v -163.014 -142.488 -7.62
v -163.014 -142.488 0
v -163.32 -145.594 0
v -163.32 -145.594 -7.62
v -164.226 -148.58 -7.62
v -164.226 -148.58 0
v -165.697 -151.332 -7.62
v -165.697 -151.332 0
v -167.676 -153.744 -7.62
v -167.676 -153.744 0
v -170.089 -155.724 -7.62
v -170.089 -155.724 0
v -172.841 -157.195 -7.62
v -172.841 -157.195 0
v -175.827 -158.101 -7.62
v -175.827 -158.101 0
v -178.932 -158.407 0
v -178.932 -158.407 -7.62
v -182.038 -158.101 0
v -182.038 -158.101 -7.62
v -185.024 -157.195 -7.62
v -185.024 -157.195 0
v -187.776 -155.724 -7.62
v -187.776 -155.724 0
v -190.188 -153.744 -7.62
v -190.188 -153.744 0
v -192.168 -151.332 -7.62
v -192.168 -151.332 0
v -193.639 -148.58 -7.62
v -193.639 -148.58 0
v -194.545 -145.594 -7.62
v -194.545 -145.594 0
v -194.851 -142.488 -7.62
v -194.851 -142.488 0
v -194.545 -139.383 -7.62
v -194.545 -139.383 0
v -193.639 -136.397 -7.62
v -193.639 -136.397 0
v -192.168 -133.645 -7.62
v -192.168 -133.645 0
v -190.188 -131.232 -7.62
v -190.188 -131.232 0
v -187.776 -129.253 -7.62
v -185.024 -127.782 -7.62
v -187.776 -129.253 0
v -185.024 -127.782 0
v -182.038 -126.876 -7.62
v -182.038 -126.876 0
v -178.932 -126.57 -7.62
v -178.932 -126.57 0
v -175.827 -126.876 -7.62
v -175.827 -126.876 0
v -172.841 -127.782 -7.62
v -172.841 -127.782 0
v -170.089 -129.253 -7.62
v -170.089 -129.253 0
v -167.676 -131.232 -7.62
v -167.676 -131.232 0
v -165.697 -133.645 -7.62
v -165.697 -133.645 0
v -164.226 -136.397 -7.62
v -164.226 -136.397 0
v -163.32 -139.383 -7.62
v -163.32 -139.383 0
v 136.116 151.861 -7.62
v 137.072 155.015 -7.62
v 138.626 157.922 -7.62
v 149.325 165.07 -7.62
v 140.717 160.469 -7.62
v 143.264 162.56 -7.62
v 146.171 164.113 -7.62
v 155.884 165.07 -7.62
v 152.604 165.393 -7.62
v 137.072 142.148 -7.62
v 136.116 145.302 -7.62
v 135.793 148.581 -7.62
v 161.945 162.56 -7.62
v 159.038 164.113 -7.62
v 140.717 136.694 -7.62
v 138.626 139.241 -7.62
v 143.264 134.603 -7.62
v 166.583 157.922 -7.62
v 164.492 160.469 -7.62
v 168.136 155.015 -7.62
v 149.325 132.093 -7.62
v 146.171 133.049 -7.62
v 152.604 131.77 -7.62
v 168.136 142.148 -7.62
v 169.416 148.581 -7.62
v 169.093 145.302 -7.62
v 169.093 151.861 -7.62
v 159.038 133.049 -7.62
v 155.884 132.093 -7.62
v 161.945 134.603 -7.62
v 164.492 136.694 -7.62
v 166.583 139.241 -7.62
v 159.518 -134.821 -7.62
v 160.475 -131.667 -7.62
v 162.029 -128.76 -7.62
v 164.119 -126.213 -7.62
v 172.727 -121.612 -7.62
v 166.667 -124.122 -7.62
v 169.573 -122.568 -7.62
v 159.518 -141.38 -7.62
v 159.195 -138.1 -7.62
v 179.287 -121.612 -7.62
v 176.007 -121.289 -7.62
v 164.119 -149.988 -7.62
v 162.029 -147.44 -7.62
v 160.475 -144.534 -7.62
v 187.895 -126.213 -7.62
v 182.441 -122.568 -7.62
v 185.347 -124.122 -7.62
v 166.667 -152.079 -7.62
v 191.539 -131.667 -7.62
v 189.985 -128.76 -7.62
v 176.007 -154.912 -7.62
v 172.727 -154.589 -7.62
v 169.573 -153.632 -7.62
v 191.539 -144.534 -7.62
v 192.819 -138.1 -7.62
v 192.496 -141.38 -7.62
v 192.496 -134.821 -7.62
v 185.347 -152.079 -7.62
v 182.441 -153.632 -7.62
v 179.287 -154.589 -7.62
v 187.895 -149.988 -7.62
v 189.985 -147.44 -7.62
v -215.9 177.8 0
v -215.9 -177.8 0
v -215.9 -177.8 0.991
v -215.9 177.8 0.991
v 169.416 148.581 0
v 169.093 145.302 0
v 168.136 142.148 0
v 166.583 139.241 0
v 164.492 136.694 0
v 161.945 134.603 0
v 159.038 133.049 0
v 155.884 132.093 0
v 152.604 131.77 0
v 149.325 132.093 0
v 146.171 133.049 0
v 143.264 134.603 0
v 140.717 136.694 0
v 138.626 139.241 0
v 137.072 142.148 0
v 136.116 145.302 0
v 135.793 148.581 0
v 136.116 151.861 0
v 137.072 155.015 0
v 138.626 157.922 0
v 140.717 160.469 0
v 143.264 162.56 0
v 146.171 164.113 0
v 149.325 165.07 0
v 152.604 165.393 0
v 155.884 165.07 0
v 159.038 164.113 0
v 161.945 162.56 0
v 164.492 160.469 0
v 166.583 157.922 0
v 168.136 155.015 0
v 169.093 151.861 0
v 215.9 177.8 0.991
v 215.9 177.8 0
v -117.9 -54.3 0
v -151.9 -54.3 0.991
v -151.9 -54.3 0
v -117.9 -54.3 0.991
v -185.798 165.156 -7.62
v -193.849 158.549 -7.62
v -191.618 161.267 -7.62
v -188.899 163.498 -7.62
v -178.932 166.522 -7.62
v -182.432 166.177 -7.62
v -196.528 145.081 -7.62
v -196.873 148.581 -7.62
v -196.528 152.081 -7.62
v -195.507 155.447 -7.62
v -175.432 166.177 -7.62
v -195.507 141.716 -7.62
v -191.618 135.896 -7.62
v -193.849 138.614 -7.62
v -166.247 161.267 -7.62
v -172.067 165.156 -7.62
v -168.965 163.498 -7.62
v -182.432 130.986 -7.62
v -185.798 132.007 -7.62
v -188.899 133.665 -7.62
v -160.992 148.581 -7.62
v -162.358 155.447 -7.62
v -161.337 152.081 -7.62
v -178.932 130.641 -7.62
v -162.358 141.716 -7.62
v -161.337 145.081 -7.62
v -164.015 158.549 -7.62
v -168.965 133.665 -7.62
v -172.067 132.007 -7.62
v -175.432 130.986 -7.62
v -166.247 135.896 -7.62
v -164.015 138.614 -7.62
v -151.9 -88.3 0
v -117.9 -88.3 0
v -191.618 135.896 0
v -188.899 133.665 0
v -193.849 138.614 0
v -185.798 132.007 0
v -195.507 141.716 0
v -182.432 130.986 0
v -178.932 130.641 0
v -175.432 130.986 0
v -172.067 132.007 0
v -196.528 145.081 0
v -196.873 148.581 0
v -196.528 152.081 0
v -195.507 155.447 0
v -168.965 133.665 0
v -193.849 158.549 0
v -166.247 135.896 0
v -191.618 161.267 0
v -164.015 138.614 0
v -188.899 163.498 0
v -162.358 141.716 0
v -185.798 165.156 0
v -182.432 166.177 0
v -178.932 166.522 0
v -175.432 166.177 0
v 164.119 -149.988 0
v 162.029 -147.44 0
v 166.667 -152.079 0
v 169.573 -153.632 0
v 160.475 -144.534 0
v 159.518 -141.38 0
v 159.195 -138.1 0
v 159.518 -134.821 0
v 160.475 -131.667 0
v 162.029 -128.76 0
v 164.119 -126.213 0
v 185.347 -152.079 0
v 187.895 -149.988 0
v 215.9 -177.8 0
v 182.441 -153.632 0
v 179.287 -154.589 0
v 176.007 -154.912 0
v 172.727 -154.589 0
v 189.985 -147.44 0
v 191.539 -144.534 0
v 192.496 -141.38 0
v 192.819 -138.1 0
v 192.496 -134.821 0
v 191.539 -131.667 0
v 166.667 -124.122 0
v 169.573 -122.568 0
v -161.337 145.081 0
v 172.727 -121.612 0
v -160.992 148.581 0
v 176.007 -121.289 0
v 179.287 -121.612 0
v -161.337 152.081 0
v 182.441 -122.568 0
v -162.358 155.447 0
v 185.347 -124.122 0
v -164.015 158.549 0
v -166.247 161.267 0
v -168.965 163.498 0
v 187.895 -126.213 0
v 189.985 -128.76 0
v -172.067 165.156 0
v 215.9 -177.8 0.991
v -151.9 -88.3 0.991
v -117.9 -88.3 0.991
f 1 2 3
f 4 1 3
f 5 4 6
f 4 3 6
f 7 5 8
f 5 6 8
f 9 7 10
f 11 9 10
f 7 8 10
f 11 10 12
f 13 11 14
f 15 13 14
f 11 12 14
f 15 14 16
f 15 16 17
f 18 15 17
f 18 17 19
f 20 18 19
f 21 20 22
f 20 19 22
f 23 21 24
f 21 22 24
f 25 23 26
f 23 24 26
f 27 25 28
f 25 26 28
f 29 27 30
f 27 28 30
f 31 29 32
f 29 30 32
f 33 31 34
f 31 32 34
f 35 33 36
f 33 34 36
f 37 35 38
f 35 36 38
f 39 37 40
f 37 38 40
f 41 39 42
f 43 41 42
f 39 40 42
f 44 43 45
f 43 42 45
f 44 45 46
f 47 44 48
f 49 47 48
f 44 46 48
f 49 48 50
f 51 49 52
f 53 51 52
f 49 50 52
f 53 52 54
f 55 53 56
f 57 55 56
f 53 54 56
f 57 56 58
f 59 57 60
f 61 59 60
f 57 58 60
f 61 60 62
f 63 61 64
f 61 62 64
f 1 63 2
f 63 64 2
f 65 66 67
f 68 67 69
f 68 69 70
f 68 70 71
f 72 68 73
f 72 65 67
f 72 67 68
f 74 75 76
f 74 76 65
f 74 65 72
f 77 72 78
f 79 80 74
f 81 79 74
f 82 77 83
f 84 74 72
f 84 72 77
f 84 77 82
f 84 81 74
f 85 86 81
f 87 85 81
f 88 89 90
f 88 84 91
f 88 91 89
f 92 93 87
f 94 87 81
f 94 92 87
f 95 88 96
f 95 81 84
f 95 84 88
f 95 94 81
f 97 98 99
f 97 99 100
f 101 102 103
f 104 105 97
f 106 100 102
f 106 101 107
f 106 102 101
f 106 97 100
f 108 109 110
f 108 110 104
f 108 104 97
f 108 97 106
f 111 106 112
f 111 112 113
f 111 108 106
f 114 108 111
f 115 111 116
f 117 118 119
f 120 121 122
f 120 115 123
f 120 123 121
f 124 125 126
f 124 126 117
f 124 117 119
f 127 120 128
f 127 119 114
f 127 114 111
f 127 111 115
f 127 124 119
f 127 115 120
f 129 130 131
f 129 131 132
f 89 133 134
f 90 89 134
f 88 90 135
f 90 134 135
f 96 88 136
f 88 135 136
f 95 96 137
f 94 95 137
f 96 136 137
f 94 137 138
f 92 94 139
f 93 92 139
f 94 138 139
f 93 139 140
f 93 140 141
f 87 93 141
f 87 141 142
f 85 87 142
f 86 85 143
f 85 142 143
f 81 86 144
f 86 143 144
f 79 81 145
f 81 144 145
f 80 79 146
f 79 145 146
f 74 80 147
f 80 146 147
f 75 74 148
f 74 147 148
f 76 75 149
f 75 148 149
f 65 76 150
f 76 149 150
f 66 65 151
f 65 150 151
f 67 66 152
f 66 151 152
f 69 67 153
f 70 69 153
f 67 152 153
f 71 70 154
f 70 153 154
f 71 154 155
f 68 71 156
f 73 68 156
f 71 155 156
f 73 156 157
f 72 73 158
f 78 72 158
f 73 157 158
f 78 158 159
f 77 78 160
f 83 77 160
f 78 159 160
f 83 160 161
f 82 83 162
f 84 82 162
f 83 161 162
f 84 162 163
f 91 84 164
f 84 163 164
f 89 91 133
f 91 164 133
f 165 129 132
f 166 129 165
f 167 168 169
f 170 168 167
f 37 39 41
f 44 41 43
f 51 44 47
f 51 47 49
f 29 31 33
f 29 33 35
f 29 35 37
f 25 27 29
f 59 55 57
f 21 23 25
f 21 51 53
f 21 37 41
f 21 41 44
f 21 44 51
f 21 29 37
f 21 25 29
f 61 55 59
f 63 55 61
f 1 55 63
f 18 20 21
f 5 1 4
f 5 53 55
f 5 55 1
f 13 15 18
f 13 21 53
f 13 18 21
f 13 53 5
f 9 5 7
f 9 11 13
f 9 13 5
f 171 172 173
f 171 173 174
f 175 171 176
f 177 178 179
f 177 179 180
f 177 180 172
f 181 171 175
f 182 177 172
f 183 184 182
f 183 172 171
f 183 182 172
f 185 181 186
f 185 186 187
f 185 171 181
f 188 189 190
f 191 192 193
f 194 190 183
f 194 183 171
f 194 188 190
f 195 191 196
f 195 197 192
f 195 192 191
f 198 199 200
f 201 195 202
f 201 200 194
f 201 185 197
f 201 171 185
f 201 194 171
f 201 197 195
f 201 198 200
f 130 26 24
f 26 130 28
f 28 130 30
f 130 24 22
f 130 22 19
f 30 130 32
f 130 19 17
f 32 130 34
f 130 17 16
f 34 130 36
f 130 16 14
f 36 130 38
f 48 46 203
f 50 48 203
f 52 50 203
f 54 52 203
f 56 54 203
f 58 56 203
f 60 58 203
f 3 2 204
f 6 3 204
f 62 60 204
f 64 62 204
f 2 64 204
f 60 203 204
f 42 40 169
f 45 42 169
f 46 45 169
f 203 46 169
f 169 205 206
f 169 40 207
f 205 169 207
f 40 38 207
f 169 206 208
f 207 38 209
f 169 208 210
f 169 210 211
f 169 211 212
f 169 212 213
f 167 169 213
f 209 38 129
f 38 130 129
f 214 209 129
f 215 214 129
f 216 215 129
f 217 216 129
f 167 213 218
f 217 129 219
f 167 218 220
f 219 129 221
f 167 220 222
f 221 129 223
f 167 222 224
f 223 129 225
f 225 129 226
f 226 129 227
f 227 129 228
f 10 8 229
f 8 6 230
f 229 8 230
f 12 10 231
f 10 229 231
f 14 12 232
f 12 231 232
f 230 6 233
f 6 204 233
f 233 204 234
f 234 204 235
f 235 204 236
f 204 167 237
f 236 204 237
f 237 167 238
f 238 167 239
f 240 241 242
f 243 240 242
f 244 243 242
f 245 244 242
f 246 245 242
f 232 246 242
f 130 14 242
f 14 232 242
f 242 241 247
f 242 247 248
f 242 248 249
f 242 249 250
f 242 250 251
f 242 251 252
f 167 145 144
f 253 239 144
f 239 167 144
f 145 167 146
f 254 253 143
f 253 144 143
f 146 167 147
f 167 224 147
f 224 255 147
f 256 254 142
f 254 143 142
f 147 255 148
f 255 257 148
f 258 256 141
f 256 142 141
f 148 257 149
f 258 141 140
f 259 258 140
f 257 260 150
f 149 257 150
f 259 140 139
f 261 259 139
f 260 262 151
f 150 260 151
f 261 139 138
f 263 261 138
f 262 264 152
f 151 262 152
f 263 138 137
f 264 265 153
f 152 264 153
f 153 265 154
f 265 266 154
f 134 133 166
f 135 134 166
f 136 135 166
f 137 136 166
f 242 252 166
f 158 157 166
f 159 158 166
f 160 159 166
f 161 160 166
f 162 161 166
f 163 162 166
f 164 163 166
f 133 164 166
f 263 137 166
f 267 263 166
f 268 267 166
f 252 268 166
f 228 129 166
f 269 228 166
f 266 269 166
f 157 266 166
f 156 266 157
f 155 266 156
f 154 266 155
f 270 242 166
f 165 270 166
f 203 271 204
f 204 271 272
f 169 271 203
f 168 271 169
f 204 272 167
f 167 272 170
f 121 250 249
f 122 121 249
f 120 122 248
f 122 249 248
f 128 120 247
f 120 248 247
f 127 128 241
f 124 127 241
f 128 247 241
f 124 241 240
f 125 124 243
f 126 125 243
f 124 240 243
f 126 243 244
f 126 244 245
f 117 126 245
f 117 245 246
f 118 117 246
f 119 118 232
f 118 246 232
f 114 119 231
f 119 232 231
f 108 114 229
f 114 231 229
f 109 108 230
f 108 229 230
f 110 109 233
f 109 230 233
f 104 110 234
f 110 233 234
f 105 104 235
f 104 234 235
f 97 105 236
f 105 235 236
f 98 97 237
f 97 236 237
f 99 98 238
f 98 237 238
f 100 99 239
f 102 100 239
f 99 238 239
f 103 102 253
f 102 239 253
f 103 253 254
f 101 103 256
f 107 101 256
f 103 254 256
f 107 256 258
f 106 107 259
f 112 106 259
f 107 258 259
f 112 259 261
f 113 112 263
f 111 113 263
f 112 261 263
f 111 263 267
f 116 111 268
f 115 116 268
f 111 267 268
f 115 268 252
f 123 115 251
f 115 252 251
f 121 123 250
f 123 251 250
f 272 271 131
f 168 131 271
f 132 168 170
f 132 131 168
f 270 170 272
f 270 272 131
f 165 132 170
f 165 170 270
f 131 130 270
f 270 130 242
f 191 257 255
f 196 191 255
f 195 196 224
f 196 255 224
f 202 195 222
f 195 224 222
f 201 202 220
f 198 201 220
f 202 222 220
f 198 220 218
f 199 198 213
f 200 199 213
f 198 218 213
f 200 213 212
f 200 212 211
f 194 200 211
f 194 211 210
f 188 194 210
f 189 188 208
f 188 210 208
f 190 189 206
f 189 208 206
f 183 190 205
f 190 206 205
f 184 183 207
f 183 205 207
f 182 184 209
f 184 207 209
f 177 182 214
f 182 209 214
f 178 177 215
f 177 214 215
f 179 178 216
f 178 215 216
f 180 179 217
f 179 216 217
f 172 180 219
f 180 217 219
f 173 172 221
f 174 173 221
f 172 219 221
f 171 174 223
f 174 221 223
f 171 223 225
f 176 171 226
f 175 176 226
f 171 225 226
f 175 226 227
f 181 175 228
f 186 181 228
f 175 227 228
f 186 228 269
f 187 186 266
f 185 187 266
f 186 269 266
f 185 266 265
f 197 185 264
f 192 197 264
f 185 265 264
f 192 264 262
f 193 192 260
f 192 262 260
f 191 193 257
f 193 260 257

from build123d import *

# Parameters (mm, degrees)
SKETCH1_W           = 431.8
SKETCH1_H           = 355.6
BOSS_EXTRUDE1_DEPTH = 0.9906
SKETCH2_W           = 34
SKETCH2_H           = 34
CUT_EXTRUDE1_DEPTH  = 280.690241675
SKETCH3_R           = 16.811779192
SKETCH3_R_2         = 17.94039836
SKETCH3_R_3         = 15.918471064
BOSS_EXTRUDE2_DEPTH = 7.62


with BuildPart() as part:
    # Sketch1 → Boss-Extrude1 (new body)
    with BuildSketch(Plane.XY):
        Rectangle(SKETCH1_W, SKETCH1_H)
    extrude(amount=BOSS_EXTRUDE1_DEPTH)

    # Sketch2 → Cut-Extrude1 (cut, through all)
    with BuildSketch(Plane.XY.offset(0.9906)):
        with Locations((-134.9, -71.3)):
            Rectangle(SKETCH2_W, SKETCH2_H)
    extrude(amount=-CUT_EXTRUDE1_DEPTH, mode=Mode.SUBTRACT)

    # Sketch3 → Boss-Extrude2 (add)
    with BuildSketch(Plane(origin=(0, 0, 0), x_dir=(-1, 0, 0), z_dir=(0, 0, -1))):
        with Locations(Location((-152.604411187, 148.581420283, 0), (0, 0, 180))):
            Circle(SKETCH3_R)
        with Locations(Location((178.932328772, 148.581420283, 0), (0, 0, 180))):
            Circle(SKETCH3_R_2)
        with Locations(Location((-176.007004595, -138.100348975, 0), (0, 0, 180))):
            Circle(SKETCH3_R)
        with Locations(Location((178.932328772, -142.488335239, 0), (0, 0, 180))):
            Circle(SKETCH3_R_3)
    extrude(amount=BOSS_EXTRUDE2_DEPTH)


solid = part.part
